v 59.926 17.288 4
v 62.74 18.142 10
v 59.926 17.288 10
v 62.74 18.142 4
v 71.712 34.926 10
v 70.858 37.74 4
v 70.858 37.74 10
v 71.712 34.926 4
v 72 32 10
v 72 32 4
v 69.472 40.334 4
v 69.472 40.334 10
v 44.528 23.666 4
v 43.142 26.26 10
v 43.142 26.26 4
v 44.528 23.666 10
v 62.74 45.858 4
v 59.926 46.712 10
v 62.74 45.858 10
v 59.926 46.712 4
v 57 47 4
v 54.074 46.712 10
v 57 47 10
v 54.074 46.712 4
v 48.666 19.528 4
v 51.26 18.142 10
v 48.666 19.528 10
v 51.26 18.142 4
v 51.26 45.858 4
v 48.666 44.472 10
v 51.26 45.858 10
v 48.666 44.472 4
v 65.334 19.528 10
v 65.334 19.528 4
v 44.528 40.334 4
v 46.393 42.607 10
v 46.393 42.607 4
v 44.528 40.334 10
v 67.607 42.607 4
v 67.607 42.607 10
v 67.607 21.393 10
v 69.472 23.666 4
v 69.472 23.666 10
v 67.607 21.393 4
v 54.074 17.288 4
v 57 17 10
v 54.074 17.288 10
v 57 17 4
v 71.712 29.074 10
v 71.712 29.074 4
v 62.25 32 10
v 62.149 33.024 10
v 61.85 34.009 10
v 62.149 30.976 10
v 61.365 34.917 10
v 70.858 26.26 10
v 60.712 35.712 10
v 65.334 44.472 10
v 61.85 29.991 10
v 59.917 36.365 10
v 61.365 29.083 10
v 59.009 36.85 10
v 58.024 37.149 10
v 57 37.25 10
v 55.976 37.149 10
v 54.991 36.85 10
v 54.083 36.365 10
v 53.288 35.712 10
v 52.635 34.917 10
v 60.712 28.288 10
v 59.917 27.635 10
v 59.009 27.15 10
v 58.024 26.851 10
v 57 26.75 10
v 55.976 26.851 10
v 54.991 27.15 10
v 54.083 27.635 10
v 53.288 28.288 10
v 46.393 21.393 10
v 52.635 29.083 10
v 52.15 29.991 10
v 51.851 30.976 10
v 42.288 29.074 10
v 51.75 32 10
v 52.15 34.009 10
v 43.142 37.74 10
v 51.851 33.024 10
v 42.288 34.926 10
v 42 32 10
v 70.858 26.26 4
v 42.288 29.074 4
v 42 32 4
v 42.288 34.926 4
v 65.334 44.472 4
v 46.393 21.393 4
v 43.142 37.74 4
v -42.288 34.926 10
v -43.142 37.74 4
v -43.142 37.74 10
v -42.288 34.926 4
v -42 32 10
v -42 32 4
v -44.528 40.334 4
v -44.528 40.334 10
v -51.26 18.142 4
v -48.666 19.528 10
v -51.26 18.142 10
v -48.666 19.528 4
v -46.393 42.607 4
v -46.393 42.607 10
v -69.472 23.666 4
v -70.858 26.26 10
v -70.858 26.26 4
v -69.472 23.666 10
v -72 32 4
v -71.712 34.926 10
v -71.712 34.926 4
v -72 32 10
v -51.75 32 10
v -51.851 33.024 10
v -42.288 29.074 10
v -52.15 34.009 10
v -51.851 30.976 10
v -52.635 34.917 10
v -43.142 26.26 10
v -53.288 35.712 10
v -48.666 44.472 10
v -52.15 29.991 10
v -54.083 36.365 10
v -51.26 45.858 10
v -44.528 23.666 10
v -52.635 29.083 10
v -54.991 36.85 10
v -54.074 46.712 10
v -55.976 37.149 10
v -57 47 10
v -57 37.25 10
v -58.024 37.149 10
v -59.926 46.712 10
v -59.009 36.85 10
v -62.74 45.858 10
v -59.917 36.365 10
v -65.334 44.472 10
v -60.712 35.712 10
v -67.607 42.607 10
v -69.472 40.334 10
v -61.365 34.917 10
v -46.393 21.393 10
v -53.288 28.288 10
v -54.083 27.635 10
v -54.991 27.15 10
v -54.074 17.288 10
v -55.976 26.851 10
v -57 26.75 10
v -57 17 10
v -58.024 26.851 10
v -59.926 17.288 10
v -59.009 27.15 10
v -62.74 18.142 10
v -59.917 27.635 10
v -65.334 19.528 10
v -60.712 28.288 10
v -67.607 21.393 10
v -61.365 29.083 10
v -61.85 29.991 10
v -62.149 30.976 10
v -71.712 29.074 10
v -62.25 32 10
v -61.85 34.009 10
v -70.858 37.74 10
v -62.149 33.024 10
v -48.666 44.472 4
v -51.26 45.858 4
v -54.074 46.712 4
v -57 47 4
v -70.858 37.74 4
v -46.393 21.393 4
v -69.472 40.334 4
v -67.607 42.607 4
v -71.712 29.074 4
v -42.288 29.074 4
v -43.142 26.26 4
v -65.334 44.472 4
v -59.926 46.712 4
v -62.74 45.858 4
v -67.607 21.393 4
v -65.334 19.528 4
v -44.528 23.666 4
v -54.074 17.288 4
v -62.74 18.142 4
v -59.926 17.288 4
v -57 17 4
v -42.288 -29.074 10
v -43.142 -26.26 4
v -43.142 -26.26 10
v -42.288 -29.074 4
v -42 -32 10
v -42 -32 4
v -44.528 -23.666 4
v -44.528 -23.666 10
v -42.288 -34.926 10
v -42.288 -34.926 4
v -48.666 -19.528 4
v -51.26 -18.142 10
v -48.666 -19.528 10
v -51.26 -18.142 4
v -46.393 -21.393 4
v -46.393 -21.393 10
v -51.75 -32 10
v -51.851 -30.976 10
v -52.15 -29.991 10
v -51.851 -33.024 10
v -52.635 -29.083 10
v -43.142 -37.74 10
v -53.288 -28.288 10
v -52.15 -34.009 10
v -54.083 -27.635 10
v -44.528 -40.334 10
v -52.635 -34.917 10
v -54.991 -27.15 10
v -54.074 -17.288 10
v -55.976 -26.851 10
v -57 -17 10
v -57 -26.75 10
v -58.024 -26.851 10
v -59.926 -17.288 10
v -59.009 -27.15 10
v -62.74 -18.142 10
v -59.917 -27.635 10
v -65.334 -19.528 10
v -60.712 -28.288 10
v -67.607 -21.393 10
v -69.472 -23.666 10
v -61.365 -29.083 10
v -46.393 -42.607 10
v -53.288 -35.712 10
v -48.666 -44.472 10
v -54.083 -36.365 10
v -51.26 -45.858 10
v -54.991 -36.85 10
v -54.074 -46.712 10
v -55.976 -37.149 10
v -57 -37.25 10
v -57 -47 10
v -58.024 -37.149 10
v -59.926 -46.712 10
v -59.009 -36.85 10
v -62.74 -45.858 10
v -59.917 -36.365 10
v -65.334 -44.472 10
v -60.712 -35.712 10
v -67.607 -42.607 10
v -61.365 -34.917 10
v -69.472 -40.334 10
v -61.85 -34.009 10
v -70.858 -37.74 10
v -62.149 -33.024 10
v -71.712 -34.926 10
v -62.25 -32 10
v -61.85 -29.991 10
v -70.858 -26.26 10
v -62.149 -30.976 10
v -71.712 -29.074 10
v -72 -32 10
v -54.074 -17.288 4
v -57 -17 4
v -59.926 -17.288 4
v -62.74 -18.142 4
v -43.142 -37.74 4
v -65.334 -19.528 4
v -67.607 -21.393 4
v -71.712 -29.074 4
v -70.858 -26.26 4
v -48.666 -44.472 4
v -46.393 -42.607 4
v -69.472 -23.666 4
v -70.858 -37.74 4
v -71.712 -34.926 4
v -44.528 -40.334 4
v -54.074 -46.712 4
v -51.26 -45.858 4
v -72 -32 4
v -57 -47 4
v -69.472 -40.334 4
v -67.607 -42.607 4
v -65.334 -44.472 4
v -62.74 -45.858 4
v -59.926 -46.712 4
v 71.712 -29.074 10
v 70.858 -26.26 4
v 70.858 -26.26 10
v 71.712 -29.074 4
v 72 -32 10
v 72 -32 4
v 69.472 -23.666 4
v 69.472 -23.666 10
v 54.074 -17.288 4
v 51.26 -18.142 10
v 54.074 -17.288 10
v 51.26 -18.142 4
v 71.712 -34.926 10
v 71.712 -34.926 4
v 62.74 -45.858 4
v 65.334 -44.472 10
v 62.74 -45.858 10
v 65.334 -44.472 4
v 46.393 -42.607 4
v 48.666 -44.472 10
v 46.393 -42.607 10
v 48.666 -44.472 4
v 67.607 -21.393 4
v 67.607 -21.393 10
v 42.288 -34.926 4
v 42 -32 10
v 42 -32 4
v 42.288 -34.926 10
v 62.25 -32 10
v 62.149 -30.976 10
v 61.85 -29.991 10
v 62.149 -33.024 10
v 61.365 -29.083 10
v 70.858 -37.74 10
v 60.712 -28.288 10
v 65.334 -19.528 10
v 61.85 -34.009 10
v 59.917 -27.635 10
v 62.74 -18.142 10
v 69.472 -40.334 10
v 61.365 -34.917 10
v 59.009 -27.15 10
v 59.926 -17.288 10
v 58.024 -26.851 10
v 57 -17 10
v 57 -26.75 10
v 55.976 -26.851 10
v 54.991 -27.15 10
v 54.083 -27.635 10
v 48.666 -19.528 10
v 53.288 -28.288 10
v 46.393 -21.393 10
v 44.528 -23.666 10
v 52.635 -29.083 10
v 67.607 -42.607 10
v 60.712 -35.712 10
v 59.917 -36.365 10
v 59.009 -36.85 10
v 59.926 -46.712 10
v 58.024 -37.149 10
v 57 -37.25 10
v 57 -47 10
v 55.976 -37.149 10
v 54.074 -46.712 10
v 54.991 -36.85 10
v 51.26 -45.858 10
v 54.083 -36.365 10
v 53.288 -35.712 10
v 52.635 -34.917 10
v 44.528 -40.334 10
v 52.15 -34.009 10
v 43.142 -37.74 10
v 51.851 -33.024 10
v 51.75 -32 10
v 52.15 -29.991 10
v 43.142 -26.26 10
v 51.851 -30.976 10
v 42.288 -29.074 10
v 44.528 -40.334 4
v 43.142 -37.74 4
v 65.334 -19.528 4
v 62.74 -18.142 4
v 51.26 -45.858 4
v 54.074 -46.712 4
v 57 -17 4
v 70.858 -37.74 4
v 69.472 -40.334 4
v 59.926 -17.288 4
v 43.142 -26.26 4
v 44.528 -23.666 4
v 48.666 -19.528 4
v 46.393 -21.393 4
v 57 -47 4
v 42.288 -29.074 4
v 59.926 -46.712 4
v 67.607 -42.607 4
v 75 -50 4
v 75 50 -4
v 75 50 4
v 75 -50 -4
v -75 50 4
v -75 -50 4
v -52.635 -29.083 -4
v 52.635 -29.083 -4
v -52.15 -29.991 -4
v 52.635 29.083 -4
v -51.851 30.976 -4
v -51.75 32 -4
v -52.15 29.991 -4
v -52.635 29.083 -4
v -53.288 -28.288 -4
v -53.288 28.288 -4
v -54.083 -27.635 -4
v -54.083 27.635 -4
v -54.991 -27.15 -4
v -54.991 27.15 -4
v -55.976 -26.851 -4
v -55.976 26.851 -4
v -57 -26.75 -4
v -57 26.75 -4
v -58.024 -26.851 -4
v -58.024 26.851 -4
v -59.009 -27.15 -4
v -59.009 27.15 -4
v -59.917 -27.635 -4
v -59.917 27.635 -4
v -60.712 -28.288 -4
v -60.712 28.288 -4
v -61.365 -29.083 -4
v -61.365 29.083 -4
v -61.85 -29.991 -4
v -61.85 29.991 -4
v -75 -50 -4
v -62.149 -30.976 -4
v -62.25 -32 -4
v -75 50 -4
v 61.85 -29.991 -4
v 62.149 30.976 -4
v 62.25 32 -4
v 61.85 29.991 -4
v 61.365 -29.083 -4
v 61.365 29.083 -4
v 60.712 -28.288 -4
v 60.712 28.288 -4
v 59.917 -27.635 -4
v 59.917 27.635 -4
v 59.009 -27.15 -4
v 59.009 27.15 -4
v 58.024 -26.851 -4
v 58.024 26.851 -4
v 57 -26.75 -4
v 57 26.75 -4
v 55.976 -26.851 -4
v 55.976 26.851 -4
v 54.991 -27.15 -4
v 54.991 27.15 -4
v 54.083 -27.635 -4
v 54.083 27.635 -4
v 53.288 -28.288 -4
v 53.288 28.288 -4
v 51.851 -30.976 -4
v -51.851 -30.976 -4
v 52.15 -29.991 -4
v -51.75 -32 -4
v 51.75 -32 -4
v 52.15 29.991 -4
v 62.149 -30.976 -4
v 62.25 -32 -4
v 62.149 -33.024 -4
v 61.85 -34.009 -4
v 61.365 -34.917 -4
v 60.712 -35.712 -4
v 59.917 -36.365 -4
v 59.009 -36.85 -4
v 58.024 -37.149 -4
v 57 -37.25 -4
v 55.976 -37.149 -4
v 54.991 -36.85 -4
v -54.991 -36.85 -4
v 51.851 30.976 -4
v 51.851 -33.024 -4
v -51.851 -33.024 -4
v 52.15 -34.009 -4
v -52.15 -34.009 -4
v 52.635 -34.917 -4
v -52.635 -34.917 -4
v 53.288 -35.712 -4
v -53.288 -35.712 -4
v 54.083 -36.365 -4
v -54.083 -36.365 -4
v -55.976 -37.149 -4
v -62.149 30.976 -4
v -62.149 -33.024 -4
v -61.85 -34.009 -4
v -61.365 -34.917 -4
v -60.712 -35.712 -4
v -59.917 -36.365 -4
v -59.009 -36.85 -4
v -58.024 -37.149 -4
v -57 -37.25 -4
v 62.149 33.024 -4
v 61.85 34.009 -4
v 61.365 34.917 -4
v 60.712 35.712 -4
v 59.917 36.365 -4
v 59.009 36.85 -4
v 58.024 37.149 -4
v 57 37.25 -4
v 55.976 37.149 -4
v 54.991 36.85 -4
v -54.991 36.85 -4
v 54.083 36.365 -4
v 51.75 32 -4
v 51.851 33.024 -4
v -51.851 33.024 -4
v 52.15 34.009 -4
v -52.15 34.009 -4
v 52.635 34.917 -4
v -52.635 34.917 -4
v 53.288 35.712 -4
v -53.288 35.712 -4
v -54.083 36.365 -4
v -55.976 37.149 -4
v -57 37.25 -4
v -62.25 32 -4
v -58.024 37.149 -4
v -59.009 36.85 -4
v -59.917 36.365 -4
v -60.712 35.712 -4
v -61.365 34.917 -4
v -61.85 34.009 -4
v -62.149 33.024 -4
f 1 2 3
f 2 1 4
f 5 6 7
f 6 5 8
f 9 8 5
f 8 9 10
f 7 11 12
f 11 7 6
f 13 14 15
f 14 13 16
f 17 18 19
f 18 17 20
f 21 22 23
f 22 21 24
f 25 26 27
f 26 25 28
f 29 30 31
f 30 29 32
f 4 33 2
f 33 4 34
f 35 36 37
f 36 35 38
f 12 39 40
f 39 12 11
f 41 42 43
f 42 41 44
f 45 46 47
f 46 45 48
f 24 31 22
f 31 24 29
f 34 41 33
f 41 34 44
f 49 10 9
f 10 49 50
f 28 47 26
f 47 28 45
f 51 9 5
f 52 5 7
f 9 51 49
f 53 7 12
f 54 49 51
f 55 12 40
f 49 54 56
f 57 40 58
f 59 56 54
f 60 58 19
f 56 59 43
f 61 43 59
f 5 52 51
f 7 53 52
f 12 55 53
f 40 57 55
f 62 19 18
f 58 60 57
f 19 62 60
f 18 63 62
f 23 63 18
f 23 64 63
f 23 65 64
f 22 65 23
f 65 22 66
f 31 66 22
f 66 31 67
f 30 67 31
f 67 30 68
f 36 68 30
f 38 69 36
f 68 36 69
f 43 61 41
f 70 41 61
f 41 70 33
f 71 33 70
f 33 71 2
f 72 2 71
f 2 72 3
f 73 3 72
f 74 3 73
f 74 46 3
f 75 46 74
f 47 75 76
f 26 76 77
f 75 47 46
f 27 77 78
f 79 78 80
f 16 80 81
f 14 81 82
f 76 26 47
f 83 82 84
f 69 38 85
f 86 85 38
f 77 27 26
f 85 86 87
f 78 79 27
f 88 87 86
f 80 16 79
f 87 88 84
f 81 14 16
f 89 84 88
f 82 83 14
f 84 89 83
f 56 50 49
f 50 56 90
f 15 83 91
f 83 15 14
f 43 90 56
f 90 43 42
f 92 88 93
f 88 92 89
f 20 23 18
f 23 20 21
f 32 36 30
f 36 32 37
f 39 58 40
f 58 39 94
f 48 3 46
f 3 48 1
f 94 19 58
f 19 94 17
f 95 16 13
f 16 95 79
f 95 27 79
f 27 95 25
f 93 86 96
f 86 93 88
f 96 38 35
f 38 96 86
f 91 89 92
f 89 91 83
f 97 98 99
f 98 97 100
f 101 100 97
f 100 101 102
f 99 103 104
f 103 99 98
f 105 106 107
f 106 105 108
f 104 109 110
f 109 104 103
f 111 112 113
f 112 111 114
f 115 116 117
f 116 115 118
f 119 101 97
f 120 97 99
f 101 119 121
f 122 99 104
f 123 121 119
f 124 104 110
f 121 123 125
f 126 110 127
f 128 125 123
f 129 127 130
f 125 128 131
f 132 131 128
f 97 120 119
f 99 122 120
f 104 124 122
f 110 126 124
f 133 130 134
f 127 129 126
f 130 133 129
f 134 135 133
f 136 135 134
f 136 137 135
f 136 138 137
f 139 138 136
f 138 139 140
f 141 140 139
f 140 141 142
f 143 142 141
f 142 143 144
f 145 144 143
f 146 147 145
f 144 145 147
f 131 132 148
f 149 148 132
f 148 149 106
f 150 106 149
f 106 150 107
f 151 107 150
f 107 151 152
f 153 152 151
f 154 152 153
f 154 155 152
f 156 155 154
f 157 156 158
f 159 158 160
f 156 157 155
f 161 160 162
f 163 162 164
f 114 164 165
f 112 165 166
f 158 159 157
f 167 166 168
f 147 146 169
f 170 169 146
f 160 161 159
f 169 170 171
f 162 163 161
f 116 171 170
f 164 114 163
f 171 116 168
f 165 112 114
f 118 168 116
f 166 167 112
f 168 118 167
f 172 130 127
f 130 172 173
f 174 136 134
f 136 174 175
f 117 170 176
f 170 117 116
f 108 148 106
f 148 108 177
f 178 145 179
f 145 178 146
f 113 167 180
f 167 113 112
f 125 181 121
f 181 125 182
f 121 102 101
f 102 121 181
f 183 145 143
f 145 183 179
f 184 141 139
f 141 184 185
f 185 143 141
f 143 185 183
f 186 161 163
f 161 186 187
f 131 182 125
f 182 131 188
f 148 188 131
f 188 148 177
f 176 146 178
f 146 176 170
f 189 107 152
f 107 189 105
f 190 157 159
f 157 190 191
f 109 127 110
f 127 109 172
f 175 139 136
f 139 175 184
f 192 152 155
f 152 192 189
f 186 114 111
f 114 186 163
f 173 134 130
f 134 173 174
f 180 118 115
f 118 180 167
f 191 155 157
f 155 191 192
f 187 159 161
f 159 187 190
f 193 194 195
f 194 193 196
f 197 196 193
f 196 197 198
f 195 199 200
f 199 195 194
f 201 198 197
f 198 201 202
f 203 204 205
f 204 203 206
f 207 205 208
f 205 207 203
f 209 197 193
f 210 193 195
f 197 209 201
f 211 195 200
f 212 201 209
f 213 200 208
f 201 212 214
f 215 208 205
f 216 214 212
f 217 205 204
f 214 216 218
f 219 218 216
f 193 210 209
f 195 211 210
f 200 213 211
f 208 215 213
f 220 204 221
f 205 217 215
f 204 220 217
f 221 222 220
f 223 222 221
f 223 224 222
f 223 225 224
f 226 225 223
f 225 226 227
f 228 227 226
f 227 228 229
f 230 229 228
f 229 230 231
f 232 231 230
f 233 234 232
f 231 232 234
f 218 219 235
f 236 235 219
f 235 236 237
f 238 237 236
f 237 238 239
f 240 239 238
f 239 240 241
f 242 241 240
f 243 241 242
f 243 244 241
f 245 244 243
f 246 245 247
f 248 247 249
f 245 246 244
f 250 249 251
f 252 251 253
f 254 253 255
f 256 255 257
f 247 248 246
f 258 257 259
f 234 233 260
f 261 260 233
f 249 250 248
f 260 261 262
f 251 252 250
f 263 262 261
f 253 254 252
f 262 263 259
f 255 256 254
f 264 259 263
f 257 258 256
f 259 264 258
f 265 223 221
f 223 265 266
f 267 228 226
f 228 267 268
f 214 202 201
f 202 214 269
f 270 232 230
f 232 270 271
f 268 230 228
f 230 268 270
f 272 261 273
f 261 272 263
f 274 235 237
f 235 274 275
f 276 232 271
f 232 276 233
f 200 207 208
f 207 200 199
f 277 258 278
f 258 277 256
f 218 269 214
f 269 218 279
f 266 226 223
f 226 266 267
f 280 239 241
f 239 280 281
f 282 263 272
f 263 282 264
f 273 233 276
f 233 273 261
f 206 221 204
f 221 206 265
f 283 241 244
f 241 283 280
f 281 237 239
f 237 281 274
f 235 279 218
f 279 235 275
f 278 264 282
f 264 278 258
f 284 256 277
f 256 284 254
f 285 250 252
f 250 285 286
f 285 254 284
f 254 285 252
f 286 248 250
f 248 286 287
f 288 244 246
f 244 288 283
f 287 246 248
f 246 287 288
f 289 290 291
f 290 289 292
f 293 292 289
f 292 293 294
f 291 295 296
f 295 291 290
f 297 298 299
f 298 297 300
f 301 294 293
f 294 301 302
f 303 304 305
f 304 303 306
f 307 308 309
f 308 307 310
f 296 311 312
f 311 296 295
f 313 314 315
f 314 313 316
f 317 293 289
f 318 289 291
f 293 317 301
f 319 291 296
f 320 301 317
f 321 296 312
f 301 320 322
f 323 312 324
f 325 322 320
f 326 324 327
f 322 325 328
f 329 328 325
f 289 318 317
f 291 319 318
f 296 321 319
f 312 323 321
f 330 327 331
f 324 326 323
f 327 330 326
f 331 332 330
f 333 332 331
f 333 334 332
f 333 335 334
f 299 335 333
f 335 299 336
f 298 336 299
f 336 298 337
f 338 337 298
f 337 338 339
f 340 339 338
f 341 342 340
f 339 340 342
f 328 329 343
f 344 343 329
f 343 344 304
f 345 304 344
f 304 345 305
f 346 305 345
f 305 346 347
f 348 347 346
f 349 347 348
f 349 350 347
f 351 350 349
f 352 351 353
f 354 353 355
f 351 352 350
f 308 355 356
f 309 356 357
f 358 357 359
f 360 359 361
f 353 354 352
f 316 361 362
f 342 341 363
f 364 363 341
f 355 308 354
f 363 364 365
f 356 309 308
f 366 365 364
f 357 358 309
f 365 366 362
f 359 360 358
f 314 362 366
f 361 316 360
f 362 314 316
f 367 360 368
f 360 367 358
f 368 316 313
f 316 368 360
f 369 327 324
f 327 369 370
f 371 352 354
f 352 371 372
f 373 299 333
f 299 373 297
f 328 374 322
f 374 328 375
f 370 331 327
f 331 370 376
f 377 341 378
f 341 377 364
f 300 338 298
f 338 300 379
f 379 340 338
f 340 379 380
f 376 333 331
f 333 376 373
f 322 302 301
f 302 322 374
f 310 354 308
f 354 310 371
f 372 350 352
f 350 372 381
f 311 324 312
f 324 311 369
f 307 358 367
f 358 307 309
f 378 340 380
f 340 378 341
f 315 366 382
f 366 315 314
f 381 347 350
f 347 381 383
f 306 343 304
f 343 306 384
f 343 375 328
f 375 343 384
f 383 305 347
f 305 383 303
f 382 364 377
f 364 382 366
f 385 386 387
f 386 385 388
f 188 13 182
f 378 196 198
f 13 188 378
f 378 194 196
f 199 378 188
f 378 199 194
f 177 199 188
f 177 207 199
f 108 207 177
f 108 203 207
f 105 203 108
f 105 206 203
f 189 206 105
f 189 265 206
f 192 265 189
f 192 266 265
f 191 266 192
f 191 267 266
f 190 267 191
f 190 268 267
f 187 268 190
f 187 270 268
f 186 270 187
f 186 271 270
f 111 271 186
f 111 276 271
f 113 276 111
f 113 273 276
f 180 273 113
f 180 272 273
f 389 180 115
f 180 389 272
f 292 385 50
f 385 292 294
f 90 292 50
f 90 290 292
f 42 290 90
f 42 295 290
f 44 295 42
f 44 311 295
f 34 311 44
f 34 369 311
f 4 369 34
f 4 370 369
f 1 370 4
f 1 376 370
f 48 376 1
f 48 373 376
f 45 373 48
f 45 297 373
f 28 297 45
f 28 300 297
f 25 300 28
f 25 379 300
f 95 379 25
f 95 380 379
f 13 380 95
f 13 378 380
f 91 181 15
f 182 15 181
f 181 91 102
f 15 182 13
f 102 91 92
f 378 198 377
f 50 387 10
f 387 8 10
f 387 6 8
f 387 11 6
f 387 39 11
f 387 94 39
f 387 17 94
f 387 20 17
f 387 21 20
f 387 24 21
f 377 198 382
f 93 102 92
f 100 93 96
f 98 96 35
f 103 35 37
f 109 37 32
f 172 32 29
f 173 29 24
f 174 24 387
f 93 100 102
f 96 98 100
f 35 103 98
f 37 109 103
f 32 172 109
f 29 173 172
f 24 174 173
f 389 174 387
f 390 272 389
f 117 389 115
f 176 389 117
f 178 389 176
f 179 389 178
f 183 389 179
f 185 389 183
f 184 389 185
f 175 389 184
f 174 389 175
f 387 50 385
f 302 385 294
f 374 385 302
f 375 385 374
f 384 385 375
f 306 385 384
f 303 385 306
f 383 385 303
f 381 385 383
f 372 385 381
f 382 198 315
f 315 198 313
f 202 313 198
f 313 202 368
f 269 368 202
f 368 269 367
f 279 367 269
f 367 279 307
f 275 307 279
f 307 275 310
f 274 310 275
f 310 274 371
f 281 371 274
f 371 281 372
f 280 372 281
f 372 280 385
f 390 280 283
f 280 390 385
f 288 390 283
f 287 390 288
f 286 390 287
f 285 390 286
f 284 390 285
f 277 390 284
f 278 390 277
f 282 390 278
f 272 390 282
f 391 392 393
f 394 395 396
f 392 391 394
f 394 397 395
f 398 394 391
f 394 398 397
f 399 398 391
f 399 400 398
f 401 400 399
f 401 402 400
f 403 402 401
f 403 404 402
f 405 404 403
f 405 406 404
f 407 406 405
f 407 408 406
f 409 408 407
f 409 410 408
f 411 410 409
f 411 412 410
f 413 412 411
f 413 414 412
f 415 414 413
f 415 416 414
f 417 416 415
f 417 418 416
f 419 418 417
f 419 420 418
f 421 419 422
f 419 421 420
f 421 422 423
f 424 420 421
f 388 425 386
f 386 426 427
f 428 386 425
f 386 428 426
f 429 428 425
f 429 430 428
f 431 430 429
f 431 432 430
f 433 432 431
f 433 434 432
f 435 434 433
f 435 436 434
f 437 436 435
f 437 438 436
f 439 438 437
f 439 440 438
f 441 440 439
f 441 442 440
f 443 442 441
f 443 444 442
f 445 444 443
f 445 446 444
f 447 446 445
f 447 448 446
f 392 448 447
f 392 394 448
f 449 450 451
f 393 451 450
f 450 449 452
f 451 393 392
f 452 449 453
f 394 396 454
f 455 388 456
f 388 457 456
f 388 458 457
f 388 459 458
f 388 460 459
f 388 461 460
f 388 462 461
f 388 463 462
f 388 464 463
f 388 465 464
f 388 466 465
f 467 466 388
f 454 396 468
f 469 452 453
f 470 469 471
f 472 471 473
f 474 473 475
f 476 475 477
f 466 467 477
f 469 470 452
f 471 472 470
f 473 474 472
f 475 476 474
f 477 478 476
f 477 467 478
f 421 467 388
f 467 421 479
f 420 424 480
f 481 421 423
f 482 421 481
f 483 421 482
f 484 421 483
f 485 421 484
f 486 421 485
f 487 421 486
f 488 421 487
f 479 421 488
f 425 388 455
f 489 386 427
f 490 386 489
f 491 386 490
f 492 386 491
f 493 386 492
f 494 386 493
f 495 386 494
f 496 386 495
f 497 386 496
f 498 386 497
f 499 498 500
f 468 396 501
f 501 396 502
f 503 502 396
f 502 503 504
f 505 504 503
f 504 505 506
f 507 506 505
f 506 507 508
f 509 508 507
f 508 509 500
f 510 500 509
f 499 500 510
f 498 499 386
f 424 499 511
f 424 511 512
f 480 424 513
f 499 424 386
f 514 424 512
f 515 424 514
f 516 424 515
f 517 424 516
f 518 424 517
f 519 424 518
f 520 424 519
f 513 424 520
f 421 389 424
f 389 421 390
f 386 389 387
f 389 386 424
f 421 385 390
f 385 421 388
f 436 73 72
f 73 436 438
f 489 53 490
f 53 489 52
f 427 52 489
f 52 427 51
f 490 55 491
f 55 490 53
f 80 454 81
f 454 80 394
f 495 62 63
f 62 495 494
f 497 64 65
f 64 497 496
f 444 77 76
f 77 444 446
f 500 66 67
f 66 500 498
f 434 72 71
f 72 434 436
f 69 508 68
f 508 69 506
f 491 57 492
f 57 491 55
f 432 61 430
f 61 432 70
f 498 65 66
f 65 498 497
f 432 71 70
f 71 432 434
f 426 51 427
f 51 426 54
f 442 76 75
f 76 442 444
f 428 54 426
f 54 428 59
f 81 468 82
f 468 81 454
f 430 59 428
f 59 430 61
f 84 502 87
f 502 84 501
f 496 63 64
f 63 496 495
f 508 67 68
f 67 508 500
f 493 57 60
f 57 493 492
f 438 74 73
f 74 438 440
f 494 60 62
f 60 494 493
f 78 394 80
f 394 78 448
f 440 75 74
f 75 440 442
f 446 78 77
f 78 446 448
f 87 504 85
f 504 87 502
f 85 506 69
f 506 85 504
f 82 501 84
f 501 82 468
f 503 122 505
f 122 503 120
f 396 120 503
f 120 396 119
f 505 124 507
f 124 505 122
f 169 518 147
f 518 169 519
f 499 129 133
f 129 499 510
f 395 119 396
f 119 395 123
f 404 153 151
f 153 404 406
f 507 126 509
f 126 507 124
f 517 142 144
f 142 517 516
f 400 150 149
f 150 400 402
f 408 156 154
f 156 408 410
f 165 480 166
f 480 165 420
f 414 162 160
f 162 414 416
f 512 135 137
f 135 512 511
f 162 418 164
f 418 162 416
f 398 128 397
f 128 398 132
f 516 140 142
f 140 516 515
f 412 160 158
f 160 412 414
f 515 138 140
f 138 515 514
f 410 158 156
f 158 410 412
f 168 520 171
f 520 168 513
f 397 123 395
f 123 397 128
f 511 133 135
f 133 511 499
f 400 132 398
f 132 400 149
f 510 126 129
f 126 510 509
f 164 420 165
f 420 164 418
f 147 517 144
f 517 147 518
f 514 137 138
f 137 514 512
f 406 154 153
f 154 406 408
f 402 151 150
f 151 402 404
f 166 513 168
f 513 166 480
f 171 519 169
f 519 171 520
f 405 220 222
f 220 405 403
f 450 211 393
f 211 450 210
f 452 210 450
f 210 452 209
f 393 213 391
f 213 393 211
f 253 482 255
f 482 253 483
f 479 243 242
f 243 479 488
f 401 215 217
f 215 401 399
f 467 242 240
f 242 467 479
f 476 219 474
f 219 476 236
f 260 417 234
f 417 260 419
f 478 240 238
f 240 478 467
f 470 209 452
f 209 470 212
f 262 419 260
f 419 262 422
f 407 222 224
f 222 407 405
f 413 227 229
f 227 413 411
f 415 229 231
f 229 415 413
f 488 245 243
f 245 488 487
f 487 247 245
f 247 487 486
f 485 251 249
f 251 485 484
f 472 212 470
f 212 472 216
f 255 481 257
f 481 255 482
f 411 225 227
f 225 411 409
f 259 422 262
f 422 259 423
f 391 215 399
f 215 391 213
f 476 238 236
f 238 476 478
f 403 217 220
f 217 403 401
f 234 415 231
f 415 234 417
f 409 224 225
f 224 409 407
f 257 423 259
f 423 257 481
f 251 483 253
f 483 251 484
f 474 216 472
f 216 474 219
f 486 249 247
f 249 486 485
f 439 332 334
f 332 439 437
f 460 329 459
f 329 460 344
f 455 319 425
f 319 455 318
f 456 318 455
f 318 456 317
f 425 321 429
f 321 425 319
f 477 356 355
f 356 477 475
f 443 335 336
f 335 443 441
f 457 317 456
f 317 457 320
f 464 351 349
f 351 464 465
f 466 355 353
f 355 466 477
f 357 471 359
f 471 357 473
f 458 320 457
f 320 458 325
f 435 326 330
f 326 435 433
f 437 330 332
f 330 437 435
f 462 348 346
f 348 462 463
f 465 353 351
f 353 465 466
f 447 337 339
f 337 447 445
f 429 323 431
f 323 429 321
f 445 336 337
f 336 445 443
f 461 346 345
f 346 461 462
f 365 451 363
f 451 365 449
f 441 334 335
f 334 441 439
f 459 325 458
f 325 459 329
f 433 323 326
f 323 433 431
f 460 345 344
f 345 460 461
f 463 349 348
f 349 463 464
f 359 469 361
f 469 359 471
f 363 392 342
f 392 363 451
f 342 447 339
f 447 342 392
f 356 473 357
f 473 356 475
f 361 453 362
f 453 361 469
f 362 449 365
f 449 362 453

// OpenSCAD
$fn = 32;

// ----------------------------------------------------------------------
// Anchor pads 150 x 100 x 14
// four corner bosses with anchor holes
// ----------------------------------------------------------------------

// --- parameters (mm) ---
plate = [150, 100, 8];  // base plate size (x, y, z)
pads = 4;               // boss count, one per corner
edge = 18;              // boss centre offset from the plate edge
boss_d = 30;            // boss diameter
boss_h = 6;             // boss height above the base plate
hole_d = 10.5;          // hole diameter

// --- derived feature positions (mm) ---
height = plate[2] + boss_h;      // = 14   overall height of the part
corner_x = plate[0] / 2 - edge;  // = 57   boss centre X
corner_y = plate[1] / 2 - edge;  // = 32   boss centre Y
feature_centers = [
  [corner_x, corner_y],
  [-corner_x, corner_y],
  [-corner_x, -corner_y],
  [corner_x, -corner_y]
];   // boss centres, anchor holes are drilled there

// base plate, four bosses standing on it, anchor holes all the way through
difference() {
  union() {
    cube(plate, center = true);
    for (centre = feature_centers)
      translate([centre[0], centre[1], plate[2] / 2 - 1])
        cylinder(d = boss_d, h = boss_h + 1);
  }
  for (centre = feature_centers)
    translate([centre[0], centre[1], -height])
      cylinder(d = hole_d, h = 2 * height + 2);  // through boss and plate
}
